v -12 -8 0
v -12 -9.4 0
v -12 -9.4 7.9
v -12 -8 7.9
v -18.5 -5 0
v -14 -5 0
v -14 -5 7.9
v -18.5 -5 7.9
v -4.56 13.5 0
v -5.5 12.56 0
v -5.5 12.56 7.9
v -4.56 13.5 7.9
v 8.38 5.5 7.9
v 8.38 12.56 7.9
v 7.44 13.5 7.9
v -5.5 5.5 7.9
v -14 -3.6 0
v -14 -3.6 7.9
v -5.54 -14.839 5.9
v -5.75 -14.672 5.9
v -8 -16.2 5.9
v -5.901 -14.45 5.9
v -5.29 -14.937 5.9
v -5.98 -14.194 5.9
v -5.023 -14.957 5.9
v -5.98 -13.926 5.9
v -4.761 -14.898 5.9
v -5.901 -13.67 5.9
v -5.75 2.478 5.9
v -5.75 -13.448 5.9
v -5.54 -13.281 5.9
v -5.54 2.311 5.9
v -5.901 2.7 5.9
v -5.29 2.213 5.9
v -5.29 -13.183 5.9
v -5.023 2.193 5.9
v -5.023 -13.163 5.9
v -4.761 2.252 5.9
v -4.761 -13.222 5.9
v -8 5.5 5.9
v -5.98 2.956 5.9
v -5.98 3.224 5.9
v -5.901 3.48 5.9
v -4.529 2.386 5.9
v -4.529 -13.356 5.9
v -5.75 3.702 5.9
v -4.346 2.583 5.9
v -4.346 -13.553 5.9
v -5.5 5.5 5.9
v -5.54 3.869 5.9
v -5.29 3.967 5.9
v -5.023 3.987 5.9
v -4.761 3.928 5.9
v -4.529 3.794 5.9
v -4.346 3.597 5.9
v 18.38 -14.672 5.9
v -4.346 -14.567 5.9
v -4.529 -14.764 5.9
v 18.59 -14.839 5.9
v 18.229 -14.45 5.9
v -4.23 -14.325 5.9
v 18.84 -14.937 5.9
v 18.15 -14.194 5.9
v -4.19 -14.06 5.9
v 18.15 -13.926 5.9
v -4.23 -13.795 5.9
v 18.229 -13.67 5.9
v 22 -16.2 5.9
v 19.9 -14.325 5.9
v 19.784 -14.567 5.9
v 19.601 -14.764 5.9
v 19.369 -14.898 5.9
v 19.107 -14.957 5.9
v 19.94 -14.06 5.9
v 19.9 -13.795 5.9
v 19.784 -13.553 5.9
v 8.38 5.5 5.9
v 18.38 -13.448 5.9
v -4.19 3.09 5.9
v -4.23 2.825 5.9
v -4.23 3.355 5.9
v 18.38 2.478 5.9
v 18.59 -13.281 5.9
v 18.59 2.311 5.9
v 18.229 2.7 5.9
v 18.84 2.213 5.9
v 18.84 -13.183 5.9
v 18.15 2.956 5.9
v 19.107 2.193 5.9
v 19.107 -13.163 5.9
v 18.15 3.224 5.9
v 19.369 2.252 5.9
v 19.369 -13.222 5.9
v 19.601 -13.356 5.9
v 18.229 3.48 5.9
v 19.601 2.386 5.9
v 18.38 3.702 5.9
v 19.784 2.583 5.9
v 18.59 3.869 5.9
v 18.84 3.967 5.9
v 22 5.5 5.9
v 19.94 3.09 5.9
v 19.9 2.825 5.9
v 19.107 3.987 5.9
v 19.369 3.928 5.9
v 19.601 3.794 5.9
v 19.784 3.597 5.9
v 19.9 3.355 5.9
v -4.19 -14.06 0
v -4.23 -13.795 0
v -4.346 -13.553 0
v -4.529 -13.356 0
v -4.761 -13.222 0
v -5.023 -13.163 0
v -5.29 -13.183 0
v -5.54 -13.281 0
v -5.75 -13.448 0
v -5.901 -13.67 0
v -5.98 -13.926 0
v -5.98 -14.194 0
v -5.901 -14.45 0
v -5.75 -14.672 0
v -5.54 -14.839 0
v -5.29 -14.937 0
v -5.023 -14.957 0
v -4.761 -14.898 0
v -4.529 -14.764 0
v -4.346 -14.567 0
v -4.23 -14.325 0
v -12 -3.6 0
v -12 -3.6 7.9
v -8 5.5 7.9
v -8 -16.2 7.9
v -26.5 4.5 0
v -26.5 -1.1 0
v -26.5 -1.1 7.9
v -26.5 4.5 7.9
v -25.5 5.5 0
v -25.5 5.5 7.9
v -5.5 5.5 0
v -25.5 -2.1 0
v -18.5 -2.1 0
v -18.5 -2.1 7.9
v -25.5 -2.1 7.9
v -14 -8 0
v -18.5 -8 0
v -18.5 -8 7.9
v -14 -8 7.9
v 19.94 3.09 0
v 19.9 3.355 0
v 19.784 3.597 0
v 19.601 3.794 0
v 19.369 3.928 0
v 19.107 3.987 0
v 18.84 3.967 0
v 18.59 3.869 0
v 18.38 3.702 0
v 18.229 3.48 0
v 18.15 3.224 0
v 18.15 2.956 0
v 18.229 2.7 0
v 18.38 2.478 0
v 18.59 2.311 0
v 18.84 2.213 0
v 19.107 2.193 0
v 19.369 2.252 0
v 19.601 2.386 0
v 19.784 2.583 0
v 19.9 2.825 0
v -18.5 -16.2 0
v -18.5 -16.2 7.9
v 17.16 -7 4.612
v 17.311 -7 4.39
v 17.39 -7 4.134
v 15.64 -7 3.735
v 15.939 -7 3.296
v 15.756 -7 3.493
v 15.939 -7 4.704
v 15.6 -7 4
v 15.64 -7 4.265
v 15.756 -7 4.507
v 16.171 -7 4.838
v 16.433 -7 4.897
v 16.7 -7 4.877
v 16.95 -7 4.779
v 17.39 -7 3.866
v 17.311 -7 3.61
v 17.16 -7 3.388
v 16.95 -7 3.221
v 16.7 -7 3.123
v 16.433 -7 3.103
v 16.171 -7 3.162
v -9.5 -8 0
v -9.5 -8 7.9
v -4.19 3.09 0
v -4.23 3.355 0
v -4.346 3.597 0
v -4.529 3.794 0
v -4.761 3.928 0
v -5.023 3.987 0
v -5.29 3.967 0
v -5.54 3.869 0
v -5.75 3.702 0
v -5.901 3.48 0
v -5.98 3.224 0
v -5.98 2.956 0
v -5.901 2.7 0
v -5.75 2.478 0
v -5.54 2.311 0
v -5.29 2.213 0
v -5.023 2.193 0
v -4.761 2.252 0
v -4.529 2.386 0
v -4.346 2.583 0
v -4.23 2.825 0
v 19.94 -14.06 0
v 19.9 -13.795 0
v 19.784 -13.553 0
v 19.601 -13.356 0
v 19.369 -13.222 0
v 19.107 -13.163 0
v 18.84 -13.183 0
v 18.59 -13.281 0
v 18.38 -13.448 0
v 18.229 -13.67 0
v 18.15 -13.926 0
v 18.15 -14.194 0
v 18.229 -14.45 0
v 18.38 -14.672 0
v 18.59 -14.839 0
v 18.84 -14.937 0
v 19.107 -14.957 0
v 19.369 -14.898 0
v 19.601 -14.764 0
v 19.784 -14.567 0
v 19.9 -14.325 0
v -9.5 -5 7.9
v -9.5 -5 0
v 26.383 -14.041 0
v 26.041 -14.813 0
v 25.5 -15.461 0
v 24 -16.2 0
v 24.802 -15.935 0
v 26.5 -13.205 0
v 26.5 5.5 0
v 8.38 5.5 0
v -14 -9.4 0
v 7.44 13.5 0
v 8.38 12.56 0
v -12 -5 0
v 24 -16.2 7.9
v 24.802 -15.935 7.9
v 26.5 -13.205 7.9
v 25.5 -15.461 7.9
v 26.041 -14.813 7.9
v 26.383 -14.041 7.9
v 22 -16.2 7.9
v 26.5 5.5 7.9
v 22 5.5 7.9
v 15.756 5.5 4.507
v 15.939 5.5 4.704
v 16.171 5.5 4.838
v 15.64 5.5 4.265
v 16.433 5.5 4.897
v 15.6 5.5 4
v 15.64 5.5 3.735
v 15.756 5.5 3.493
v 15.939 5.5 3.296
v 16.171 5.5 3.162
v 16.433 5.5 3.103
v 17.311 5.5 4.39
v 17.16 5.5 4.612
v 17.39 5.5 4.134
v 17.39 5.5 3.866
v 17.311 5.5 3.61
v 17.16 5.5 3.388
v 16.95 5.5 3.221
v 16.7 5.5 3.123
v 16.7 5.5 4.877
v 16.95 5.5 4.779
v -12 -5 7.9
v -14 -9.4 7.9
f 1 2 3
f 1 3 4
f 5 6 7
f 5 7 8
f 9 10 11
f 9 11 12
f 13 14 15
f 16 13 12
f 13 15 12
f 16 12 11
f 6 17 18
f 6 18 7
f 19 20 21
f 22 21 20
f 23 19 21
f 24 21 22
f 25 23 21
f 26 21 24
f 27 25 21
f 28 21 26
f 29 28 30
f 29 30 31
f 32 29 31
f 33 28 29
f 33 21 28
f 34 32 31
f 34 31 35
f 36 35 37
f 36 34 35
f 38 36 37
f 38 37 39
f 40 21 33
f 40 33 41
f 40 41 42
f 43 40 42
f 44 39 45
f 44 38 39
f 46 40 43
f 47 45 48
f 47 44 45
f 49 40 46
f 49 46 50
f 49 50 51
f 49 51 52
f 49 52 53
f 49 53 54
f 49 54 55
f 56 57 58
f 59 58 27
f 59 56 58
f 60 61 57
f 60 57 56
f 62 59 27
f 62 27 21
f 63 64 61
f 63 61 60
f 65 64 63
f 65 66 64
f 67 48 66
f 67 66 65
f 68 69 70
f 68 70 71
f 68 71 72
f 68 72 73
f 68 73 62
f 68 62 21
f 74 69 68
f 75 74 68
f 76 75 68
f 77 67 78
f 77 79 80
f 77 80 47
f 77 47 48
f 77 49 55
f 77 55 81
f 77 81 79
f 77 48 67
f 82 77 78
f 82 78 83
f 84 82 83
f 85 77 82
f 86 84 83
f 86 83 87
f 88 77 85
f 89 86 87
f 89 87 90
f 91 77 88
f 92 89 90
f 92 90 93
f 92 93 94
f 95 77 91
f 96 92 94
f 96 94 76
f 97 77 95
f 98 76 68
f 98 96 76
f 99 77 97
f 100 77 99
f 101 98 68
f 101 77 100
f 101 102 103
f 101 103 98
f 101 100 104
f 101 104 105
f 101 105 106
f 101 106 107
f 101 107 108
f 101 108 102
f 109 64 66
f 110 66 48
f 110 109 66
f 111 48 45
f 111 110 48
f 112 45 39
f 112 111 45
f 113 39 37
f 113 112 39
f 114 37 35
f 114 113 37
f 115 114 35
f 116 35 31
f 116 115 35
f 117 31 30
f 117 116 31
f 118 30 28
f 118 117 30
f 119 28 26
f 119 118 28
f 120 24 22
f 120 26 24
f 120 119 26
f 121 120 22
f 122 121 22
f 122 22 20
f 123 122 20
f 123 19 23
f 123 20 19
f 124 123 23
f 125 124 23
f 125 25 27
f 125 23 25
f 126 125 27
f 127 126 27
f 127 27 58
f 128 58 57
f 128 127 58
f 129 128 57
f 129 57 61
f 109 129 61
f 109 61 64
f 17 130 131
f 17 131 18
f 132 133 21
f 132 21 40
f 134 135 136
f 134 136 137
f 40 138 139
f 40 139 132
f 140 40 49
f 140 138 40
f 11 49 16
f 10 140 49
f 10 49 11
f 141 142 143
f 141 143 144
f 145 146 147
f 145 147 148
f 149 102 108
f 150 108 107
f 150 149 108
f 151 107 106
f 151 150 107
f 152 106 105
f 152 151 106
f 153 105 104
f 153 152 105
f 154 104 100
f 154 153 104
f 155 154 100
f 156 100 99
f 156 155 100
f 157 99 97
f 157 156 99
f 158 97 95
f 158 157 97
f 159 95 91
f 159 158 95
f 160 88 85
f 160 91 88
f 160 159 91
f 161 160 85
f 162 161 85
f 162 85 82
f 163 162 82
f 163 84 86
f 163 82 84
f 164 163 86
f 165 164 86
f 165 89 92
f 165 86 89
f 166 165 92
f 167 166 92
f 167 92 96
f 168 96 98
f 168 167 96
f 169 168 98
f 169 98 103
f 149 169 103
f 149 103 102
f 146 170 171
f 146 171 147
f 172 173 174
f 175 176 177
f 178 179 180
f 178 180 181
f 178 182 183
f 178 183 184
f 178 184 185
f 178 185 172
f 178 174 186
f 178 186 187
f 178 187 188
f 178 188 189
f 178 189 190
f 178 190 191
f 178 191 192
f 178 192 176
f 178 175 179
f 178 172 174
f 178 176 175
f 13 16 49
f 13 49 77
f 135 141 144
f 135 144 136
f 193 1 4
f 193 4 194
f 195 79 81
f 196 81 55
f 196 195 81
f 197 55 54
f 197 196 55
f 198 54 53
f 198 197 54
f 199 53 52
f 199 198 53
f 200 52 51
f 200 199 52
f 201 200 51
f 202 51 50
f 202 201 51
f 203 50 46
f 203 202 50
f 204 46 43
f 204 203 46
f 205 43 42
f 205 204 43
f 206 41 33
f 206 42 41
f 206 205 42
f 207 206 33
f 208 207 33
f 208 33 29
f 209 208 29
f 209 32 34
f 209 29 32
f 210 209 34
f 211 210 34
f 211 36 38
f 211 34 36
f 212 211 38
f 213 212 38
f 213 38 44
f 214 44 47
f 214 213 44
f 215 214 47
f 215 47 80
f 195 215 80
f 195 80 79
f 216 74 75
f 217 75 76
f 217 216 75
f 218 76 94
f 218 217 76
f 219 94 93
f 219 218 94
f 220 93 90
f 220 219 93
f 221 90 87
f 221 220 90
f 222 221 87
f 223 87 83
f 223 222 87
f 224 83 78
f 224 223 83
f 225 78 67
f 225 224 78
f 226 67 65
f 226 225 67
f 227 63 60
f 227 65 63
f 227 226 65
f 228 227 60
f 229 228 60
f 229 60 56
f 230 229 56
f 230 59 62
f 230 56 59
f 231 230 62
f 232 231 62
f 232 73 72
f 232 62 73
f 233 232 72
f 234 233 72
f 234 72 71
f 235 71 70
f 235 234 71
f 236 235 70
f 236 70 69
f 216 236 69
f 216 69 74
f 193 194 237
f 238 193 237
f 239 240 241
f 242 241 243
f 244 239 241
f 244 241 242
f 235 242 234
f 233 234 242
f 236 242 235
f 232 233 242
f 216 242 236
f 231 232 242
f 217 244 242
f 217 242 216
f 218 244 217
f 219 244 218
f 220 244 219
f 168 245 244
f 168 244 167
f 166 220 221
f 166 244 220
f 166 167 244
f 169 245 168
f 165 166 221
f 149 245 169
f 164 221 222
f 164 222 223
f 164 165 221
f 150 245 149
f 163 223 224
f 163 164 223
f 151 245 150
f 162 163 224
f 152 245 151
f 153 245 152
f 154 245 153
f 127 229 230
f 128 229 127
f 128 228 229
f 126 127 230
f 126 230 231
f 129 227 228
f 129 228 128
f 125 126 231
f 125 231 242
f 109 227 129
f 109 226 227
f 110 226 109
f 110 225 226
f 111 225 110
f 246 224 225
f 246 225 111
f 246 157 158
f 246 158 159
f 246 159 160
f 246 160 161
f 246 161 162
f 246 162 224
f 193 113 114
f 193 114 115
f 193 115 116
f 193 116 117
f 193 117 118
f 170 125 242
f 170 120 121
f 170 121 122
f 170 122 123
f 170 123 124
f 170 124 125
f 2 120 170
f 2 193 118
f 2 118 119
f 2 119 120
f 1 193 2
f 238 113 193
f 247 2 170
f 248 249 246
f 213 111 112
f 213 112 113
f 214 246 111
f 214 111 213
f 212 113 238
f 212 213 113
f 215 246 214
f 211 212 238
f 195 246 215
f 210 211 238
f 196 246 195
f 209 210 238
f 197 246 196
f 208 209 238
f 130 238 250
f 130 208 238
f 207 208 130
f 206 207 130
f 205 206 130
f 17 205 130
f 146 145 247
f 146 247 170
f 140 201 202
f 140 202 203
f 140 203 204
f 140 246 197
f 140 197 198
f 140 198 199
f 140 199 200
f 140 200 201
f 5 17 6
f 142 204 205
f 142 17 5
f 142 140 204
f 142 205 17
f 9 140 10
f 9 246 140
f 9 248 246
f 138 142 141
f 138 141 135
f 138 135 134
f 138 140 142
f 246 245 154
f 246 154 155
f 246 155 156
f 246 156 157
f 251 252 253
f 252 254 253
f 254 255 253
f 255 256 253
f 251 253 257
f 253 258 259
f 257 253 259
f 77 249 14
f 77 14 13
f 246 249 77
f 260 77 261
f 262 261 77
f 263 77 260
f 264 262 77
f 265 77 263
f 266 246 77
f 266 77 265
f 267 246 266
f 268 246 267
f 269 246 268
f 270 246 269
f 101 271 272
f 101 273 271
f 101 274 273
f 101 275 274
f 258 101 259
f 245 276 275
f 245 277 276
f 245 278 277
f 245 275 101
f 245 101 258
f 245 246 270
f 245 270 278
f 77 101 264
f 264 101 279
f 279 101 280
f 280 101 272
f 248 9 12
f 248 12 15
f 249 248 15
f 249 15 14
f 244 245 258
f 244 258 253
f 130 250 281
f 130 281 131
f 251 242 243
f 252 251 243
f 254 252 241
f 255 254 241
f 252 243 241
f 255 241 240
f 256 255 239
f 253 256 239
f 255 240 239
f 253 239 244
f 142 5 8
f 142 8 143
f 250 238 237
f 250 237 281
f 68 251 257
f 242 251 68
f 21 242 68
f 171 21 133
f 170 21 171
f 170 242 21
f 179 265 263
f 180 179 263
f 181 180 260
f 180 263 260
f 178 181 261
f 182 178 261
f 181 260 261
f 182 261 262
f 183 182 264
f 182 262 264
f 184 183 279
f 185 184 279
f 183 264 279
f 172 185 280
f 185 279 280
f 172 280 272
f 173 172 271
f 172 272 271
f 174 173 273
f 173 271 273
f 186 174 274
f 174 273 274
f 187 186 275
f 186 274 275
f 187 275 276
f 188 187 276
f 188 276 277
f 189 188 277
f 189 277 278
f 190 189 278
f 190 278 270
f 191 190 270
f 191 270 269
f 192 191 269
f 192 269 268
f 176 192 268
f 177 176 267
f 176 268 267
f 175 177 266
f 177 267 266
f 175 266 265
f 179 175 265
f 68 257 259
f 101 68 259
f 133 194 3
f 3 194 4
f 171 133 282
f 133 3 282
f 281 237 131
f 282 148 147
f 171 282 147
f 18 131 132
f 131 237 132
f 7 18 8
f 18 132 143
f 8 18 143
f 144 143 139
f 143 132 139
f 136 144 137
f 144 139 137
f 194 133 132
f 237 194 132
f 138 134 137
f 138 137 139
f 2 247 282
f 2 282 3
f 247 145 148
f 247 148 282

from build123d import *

# Parameters (mm, degrees)
SKETCH002_W  = 30
SKETCH002_H  = 21.7
PAD002_DEPTH = 2
SKETCH001_R  = 0.9
PAD001_DEPTH = 10
PAD_DEPTH    = 7.9
SKETCH005_R  = 0.9
POCKET_DEPTH = 12.5


with BuildPart() as pcb_placement_puncher:
    # Sketch002 → Pad002 (new body)
    with BuildSketch(Plane.XY.offset(7.9)):
        with Locations((7, -5.35)):
            Rectangle(SKETCH002_W, SKETCH002_H)
    extrude(amount=-PAD002_DEPTH)


with BuildPart() as holes_for_pcb_puncher:
    # Sketch001 → Pad001 (new body)
    with BuildSketch(Plane.XY):
        with Locations((-5.09, 3.09)):
            Circle(SKETCH001_R)
        with Locations((19.04, 3.09)):
            Circle(SKETCH001_R)
        with Locations((19.04, -14.06)):
            Circle(SKETCH001_R)
        with Locations((-5.09, -14.06)):
            Circle(SKETCH001_R)
    extrude(amount=PAD001_DEPTH)


with BuildPart() as i3b1_31_with_ir_probe_pcb_holder:
    # Sketch → Pad (new body)
    with BuildSketch(Plane.XY):
        with BuildLine():
            Line((-5.5, 5.5), (-5.5, 12.56))
            Line((-5.5, 12.56), (-4.56, 13.5))
            Line((-4.56, 13.5), (7.44, 13.5))
            Line((7.44, 13.5), (8.38, 12.56))
            Line((8.38, 12.56), (8.38, 5.5))
            Line((8.38, 5.5), (26.5, 5.5))
            Line((26.5, 5.5), (26.5, -13.204915))
            ThreePointArc((24, -16.2), (25.792868, -15.15559), (26.5, -13.204915))
            Line((24, -16.2), (-18.5, -16.2))
            Line((-18.5, -16.2), (-18.5, -8))
            Line((-18.5, -8), (-14, -8))
            Line((-14, -8), (-14, -9.4))
            Line((-14, -9.4), (-12, -9.4))
            Line((-12, -9.4), (-12, -8))
            Line((-12, -8), (-9.5, -8))
            Line((-9.5, -8), (-9.5, -5))
            Line((-9.5, -5), (-12, -5))
            Line((-12, -5), (-12, -3.6))
            Line((-12, -3.6), (-14, -3.6))
            Line((-14, -3.6), (-14, -5))
            Line((-14, -5), (-18.5, -5))
            Line((-18.5, -5), (-18.5, -2.1))
            Line((-18.5, -2.1), (-25.5, -2.1))
            Line((-25.5, -2.1), (-26.5, -1.1))
            Line((-26.5, -1.1), (-26.5, 4.5))
            Line((-26.5, 4.5), (-25.5, 5.5))
            Line((-25.5, 5.5), (-5.5, 5.5))
        make_face()
    extrude(amount=PAD_DEPTH)

    # Cut: cut Holes for PCB Puncher
    add(holes_for_pcb_puncher.part, mode=Mode.SUBTRACT)

    # Cut001: cut PCB Placement Puncher
    add(pcb_placement_puncher.part, mode=Mode.SUBTRACT)

    # Sketch005 → Pocket (cut)
    with BuildSketch(Plane(origin=(0, 5.5, 0), x_dir=(-1, 0, 0), z_dir=(0, 1, 0))):
        with Locations((-16.5, 4)):
            Circle(SKETCH005_R)
    extrude(amount=-POCKET_DEPTH, mode=Mode.SUBTRACT)


solid = i3b1_31_with_ir_probe_pcb_holder.part
